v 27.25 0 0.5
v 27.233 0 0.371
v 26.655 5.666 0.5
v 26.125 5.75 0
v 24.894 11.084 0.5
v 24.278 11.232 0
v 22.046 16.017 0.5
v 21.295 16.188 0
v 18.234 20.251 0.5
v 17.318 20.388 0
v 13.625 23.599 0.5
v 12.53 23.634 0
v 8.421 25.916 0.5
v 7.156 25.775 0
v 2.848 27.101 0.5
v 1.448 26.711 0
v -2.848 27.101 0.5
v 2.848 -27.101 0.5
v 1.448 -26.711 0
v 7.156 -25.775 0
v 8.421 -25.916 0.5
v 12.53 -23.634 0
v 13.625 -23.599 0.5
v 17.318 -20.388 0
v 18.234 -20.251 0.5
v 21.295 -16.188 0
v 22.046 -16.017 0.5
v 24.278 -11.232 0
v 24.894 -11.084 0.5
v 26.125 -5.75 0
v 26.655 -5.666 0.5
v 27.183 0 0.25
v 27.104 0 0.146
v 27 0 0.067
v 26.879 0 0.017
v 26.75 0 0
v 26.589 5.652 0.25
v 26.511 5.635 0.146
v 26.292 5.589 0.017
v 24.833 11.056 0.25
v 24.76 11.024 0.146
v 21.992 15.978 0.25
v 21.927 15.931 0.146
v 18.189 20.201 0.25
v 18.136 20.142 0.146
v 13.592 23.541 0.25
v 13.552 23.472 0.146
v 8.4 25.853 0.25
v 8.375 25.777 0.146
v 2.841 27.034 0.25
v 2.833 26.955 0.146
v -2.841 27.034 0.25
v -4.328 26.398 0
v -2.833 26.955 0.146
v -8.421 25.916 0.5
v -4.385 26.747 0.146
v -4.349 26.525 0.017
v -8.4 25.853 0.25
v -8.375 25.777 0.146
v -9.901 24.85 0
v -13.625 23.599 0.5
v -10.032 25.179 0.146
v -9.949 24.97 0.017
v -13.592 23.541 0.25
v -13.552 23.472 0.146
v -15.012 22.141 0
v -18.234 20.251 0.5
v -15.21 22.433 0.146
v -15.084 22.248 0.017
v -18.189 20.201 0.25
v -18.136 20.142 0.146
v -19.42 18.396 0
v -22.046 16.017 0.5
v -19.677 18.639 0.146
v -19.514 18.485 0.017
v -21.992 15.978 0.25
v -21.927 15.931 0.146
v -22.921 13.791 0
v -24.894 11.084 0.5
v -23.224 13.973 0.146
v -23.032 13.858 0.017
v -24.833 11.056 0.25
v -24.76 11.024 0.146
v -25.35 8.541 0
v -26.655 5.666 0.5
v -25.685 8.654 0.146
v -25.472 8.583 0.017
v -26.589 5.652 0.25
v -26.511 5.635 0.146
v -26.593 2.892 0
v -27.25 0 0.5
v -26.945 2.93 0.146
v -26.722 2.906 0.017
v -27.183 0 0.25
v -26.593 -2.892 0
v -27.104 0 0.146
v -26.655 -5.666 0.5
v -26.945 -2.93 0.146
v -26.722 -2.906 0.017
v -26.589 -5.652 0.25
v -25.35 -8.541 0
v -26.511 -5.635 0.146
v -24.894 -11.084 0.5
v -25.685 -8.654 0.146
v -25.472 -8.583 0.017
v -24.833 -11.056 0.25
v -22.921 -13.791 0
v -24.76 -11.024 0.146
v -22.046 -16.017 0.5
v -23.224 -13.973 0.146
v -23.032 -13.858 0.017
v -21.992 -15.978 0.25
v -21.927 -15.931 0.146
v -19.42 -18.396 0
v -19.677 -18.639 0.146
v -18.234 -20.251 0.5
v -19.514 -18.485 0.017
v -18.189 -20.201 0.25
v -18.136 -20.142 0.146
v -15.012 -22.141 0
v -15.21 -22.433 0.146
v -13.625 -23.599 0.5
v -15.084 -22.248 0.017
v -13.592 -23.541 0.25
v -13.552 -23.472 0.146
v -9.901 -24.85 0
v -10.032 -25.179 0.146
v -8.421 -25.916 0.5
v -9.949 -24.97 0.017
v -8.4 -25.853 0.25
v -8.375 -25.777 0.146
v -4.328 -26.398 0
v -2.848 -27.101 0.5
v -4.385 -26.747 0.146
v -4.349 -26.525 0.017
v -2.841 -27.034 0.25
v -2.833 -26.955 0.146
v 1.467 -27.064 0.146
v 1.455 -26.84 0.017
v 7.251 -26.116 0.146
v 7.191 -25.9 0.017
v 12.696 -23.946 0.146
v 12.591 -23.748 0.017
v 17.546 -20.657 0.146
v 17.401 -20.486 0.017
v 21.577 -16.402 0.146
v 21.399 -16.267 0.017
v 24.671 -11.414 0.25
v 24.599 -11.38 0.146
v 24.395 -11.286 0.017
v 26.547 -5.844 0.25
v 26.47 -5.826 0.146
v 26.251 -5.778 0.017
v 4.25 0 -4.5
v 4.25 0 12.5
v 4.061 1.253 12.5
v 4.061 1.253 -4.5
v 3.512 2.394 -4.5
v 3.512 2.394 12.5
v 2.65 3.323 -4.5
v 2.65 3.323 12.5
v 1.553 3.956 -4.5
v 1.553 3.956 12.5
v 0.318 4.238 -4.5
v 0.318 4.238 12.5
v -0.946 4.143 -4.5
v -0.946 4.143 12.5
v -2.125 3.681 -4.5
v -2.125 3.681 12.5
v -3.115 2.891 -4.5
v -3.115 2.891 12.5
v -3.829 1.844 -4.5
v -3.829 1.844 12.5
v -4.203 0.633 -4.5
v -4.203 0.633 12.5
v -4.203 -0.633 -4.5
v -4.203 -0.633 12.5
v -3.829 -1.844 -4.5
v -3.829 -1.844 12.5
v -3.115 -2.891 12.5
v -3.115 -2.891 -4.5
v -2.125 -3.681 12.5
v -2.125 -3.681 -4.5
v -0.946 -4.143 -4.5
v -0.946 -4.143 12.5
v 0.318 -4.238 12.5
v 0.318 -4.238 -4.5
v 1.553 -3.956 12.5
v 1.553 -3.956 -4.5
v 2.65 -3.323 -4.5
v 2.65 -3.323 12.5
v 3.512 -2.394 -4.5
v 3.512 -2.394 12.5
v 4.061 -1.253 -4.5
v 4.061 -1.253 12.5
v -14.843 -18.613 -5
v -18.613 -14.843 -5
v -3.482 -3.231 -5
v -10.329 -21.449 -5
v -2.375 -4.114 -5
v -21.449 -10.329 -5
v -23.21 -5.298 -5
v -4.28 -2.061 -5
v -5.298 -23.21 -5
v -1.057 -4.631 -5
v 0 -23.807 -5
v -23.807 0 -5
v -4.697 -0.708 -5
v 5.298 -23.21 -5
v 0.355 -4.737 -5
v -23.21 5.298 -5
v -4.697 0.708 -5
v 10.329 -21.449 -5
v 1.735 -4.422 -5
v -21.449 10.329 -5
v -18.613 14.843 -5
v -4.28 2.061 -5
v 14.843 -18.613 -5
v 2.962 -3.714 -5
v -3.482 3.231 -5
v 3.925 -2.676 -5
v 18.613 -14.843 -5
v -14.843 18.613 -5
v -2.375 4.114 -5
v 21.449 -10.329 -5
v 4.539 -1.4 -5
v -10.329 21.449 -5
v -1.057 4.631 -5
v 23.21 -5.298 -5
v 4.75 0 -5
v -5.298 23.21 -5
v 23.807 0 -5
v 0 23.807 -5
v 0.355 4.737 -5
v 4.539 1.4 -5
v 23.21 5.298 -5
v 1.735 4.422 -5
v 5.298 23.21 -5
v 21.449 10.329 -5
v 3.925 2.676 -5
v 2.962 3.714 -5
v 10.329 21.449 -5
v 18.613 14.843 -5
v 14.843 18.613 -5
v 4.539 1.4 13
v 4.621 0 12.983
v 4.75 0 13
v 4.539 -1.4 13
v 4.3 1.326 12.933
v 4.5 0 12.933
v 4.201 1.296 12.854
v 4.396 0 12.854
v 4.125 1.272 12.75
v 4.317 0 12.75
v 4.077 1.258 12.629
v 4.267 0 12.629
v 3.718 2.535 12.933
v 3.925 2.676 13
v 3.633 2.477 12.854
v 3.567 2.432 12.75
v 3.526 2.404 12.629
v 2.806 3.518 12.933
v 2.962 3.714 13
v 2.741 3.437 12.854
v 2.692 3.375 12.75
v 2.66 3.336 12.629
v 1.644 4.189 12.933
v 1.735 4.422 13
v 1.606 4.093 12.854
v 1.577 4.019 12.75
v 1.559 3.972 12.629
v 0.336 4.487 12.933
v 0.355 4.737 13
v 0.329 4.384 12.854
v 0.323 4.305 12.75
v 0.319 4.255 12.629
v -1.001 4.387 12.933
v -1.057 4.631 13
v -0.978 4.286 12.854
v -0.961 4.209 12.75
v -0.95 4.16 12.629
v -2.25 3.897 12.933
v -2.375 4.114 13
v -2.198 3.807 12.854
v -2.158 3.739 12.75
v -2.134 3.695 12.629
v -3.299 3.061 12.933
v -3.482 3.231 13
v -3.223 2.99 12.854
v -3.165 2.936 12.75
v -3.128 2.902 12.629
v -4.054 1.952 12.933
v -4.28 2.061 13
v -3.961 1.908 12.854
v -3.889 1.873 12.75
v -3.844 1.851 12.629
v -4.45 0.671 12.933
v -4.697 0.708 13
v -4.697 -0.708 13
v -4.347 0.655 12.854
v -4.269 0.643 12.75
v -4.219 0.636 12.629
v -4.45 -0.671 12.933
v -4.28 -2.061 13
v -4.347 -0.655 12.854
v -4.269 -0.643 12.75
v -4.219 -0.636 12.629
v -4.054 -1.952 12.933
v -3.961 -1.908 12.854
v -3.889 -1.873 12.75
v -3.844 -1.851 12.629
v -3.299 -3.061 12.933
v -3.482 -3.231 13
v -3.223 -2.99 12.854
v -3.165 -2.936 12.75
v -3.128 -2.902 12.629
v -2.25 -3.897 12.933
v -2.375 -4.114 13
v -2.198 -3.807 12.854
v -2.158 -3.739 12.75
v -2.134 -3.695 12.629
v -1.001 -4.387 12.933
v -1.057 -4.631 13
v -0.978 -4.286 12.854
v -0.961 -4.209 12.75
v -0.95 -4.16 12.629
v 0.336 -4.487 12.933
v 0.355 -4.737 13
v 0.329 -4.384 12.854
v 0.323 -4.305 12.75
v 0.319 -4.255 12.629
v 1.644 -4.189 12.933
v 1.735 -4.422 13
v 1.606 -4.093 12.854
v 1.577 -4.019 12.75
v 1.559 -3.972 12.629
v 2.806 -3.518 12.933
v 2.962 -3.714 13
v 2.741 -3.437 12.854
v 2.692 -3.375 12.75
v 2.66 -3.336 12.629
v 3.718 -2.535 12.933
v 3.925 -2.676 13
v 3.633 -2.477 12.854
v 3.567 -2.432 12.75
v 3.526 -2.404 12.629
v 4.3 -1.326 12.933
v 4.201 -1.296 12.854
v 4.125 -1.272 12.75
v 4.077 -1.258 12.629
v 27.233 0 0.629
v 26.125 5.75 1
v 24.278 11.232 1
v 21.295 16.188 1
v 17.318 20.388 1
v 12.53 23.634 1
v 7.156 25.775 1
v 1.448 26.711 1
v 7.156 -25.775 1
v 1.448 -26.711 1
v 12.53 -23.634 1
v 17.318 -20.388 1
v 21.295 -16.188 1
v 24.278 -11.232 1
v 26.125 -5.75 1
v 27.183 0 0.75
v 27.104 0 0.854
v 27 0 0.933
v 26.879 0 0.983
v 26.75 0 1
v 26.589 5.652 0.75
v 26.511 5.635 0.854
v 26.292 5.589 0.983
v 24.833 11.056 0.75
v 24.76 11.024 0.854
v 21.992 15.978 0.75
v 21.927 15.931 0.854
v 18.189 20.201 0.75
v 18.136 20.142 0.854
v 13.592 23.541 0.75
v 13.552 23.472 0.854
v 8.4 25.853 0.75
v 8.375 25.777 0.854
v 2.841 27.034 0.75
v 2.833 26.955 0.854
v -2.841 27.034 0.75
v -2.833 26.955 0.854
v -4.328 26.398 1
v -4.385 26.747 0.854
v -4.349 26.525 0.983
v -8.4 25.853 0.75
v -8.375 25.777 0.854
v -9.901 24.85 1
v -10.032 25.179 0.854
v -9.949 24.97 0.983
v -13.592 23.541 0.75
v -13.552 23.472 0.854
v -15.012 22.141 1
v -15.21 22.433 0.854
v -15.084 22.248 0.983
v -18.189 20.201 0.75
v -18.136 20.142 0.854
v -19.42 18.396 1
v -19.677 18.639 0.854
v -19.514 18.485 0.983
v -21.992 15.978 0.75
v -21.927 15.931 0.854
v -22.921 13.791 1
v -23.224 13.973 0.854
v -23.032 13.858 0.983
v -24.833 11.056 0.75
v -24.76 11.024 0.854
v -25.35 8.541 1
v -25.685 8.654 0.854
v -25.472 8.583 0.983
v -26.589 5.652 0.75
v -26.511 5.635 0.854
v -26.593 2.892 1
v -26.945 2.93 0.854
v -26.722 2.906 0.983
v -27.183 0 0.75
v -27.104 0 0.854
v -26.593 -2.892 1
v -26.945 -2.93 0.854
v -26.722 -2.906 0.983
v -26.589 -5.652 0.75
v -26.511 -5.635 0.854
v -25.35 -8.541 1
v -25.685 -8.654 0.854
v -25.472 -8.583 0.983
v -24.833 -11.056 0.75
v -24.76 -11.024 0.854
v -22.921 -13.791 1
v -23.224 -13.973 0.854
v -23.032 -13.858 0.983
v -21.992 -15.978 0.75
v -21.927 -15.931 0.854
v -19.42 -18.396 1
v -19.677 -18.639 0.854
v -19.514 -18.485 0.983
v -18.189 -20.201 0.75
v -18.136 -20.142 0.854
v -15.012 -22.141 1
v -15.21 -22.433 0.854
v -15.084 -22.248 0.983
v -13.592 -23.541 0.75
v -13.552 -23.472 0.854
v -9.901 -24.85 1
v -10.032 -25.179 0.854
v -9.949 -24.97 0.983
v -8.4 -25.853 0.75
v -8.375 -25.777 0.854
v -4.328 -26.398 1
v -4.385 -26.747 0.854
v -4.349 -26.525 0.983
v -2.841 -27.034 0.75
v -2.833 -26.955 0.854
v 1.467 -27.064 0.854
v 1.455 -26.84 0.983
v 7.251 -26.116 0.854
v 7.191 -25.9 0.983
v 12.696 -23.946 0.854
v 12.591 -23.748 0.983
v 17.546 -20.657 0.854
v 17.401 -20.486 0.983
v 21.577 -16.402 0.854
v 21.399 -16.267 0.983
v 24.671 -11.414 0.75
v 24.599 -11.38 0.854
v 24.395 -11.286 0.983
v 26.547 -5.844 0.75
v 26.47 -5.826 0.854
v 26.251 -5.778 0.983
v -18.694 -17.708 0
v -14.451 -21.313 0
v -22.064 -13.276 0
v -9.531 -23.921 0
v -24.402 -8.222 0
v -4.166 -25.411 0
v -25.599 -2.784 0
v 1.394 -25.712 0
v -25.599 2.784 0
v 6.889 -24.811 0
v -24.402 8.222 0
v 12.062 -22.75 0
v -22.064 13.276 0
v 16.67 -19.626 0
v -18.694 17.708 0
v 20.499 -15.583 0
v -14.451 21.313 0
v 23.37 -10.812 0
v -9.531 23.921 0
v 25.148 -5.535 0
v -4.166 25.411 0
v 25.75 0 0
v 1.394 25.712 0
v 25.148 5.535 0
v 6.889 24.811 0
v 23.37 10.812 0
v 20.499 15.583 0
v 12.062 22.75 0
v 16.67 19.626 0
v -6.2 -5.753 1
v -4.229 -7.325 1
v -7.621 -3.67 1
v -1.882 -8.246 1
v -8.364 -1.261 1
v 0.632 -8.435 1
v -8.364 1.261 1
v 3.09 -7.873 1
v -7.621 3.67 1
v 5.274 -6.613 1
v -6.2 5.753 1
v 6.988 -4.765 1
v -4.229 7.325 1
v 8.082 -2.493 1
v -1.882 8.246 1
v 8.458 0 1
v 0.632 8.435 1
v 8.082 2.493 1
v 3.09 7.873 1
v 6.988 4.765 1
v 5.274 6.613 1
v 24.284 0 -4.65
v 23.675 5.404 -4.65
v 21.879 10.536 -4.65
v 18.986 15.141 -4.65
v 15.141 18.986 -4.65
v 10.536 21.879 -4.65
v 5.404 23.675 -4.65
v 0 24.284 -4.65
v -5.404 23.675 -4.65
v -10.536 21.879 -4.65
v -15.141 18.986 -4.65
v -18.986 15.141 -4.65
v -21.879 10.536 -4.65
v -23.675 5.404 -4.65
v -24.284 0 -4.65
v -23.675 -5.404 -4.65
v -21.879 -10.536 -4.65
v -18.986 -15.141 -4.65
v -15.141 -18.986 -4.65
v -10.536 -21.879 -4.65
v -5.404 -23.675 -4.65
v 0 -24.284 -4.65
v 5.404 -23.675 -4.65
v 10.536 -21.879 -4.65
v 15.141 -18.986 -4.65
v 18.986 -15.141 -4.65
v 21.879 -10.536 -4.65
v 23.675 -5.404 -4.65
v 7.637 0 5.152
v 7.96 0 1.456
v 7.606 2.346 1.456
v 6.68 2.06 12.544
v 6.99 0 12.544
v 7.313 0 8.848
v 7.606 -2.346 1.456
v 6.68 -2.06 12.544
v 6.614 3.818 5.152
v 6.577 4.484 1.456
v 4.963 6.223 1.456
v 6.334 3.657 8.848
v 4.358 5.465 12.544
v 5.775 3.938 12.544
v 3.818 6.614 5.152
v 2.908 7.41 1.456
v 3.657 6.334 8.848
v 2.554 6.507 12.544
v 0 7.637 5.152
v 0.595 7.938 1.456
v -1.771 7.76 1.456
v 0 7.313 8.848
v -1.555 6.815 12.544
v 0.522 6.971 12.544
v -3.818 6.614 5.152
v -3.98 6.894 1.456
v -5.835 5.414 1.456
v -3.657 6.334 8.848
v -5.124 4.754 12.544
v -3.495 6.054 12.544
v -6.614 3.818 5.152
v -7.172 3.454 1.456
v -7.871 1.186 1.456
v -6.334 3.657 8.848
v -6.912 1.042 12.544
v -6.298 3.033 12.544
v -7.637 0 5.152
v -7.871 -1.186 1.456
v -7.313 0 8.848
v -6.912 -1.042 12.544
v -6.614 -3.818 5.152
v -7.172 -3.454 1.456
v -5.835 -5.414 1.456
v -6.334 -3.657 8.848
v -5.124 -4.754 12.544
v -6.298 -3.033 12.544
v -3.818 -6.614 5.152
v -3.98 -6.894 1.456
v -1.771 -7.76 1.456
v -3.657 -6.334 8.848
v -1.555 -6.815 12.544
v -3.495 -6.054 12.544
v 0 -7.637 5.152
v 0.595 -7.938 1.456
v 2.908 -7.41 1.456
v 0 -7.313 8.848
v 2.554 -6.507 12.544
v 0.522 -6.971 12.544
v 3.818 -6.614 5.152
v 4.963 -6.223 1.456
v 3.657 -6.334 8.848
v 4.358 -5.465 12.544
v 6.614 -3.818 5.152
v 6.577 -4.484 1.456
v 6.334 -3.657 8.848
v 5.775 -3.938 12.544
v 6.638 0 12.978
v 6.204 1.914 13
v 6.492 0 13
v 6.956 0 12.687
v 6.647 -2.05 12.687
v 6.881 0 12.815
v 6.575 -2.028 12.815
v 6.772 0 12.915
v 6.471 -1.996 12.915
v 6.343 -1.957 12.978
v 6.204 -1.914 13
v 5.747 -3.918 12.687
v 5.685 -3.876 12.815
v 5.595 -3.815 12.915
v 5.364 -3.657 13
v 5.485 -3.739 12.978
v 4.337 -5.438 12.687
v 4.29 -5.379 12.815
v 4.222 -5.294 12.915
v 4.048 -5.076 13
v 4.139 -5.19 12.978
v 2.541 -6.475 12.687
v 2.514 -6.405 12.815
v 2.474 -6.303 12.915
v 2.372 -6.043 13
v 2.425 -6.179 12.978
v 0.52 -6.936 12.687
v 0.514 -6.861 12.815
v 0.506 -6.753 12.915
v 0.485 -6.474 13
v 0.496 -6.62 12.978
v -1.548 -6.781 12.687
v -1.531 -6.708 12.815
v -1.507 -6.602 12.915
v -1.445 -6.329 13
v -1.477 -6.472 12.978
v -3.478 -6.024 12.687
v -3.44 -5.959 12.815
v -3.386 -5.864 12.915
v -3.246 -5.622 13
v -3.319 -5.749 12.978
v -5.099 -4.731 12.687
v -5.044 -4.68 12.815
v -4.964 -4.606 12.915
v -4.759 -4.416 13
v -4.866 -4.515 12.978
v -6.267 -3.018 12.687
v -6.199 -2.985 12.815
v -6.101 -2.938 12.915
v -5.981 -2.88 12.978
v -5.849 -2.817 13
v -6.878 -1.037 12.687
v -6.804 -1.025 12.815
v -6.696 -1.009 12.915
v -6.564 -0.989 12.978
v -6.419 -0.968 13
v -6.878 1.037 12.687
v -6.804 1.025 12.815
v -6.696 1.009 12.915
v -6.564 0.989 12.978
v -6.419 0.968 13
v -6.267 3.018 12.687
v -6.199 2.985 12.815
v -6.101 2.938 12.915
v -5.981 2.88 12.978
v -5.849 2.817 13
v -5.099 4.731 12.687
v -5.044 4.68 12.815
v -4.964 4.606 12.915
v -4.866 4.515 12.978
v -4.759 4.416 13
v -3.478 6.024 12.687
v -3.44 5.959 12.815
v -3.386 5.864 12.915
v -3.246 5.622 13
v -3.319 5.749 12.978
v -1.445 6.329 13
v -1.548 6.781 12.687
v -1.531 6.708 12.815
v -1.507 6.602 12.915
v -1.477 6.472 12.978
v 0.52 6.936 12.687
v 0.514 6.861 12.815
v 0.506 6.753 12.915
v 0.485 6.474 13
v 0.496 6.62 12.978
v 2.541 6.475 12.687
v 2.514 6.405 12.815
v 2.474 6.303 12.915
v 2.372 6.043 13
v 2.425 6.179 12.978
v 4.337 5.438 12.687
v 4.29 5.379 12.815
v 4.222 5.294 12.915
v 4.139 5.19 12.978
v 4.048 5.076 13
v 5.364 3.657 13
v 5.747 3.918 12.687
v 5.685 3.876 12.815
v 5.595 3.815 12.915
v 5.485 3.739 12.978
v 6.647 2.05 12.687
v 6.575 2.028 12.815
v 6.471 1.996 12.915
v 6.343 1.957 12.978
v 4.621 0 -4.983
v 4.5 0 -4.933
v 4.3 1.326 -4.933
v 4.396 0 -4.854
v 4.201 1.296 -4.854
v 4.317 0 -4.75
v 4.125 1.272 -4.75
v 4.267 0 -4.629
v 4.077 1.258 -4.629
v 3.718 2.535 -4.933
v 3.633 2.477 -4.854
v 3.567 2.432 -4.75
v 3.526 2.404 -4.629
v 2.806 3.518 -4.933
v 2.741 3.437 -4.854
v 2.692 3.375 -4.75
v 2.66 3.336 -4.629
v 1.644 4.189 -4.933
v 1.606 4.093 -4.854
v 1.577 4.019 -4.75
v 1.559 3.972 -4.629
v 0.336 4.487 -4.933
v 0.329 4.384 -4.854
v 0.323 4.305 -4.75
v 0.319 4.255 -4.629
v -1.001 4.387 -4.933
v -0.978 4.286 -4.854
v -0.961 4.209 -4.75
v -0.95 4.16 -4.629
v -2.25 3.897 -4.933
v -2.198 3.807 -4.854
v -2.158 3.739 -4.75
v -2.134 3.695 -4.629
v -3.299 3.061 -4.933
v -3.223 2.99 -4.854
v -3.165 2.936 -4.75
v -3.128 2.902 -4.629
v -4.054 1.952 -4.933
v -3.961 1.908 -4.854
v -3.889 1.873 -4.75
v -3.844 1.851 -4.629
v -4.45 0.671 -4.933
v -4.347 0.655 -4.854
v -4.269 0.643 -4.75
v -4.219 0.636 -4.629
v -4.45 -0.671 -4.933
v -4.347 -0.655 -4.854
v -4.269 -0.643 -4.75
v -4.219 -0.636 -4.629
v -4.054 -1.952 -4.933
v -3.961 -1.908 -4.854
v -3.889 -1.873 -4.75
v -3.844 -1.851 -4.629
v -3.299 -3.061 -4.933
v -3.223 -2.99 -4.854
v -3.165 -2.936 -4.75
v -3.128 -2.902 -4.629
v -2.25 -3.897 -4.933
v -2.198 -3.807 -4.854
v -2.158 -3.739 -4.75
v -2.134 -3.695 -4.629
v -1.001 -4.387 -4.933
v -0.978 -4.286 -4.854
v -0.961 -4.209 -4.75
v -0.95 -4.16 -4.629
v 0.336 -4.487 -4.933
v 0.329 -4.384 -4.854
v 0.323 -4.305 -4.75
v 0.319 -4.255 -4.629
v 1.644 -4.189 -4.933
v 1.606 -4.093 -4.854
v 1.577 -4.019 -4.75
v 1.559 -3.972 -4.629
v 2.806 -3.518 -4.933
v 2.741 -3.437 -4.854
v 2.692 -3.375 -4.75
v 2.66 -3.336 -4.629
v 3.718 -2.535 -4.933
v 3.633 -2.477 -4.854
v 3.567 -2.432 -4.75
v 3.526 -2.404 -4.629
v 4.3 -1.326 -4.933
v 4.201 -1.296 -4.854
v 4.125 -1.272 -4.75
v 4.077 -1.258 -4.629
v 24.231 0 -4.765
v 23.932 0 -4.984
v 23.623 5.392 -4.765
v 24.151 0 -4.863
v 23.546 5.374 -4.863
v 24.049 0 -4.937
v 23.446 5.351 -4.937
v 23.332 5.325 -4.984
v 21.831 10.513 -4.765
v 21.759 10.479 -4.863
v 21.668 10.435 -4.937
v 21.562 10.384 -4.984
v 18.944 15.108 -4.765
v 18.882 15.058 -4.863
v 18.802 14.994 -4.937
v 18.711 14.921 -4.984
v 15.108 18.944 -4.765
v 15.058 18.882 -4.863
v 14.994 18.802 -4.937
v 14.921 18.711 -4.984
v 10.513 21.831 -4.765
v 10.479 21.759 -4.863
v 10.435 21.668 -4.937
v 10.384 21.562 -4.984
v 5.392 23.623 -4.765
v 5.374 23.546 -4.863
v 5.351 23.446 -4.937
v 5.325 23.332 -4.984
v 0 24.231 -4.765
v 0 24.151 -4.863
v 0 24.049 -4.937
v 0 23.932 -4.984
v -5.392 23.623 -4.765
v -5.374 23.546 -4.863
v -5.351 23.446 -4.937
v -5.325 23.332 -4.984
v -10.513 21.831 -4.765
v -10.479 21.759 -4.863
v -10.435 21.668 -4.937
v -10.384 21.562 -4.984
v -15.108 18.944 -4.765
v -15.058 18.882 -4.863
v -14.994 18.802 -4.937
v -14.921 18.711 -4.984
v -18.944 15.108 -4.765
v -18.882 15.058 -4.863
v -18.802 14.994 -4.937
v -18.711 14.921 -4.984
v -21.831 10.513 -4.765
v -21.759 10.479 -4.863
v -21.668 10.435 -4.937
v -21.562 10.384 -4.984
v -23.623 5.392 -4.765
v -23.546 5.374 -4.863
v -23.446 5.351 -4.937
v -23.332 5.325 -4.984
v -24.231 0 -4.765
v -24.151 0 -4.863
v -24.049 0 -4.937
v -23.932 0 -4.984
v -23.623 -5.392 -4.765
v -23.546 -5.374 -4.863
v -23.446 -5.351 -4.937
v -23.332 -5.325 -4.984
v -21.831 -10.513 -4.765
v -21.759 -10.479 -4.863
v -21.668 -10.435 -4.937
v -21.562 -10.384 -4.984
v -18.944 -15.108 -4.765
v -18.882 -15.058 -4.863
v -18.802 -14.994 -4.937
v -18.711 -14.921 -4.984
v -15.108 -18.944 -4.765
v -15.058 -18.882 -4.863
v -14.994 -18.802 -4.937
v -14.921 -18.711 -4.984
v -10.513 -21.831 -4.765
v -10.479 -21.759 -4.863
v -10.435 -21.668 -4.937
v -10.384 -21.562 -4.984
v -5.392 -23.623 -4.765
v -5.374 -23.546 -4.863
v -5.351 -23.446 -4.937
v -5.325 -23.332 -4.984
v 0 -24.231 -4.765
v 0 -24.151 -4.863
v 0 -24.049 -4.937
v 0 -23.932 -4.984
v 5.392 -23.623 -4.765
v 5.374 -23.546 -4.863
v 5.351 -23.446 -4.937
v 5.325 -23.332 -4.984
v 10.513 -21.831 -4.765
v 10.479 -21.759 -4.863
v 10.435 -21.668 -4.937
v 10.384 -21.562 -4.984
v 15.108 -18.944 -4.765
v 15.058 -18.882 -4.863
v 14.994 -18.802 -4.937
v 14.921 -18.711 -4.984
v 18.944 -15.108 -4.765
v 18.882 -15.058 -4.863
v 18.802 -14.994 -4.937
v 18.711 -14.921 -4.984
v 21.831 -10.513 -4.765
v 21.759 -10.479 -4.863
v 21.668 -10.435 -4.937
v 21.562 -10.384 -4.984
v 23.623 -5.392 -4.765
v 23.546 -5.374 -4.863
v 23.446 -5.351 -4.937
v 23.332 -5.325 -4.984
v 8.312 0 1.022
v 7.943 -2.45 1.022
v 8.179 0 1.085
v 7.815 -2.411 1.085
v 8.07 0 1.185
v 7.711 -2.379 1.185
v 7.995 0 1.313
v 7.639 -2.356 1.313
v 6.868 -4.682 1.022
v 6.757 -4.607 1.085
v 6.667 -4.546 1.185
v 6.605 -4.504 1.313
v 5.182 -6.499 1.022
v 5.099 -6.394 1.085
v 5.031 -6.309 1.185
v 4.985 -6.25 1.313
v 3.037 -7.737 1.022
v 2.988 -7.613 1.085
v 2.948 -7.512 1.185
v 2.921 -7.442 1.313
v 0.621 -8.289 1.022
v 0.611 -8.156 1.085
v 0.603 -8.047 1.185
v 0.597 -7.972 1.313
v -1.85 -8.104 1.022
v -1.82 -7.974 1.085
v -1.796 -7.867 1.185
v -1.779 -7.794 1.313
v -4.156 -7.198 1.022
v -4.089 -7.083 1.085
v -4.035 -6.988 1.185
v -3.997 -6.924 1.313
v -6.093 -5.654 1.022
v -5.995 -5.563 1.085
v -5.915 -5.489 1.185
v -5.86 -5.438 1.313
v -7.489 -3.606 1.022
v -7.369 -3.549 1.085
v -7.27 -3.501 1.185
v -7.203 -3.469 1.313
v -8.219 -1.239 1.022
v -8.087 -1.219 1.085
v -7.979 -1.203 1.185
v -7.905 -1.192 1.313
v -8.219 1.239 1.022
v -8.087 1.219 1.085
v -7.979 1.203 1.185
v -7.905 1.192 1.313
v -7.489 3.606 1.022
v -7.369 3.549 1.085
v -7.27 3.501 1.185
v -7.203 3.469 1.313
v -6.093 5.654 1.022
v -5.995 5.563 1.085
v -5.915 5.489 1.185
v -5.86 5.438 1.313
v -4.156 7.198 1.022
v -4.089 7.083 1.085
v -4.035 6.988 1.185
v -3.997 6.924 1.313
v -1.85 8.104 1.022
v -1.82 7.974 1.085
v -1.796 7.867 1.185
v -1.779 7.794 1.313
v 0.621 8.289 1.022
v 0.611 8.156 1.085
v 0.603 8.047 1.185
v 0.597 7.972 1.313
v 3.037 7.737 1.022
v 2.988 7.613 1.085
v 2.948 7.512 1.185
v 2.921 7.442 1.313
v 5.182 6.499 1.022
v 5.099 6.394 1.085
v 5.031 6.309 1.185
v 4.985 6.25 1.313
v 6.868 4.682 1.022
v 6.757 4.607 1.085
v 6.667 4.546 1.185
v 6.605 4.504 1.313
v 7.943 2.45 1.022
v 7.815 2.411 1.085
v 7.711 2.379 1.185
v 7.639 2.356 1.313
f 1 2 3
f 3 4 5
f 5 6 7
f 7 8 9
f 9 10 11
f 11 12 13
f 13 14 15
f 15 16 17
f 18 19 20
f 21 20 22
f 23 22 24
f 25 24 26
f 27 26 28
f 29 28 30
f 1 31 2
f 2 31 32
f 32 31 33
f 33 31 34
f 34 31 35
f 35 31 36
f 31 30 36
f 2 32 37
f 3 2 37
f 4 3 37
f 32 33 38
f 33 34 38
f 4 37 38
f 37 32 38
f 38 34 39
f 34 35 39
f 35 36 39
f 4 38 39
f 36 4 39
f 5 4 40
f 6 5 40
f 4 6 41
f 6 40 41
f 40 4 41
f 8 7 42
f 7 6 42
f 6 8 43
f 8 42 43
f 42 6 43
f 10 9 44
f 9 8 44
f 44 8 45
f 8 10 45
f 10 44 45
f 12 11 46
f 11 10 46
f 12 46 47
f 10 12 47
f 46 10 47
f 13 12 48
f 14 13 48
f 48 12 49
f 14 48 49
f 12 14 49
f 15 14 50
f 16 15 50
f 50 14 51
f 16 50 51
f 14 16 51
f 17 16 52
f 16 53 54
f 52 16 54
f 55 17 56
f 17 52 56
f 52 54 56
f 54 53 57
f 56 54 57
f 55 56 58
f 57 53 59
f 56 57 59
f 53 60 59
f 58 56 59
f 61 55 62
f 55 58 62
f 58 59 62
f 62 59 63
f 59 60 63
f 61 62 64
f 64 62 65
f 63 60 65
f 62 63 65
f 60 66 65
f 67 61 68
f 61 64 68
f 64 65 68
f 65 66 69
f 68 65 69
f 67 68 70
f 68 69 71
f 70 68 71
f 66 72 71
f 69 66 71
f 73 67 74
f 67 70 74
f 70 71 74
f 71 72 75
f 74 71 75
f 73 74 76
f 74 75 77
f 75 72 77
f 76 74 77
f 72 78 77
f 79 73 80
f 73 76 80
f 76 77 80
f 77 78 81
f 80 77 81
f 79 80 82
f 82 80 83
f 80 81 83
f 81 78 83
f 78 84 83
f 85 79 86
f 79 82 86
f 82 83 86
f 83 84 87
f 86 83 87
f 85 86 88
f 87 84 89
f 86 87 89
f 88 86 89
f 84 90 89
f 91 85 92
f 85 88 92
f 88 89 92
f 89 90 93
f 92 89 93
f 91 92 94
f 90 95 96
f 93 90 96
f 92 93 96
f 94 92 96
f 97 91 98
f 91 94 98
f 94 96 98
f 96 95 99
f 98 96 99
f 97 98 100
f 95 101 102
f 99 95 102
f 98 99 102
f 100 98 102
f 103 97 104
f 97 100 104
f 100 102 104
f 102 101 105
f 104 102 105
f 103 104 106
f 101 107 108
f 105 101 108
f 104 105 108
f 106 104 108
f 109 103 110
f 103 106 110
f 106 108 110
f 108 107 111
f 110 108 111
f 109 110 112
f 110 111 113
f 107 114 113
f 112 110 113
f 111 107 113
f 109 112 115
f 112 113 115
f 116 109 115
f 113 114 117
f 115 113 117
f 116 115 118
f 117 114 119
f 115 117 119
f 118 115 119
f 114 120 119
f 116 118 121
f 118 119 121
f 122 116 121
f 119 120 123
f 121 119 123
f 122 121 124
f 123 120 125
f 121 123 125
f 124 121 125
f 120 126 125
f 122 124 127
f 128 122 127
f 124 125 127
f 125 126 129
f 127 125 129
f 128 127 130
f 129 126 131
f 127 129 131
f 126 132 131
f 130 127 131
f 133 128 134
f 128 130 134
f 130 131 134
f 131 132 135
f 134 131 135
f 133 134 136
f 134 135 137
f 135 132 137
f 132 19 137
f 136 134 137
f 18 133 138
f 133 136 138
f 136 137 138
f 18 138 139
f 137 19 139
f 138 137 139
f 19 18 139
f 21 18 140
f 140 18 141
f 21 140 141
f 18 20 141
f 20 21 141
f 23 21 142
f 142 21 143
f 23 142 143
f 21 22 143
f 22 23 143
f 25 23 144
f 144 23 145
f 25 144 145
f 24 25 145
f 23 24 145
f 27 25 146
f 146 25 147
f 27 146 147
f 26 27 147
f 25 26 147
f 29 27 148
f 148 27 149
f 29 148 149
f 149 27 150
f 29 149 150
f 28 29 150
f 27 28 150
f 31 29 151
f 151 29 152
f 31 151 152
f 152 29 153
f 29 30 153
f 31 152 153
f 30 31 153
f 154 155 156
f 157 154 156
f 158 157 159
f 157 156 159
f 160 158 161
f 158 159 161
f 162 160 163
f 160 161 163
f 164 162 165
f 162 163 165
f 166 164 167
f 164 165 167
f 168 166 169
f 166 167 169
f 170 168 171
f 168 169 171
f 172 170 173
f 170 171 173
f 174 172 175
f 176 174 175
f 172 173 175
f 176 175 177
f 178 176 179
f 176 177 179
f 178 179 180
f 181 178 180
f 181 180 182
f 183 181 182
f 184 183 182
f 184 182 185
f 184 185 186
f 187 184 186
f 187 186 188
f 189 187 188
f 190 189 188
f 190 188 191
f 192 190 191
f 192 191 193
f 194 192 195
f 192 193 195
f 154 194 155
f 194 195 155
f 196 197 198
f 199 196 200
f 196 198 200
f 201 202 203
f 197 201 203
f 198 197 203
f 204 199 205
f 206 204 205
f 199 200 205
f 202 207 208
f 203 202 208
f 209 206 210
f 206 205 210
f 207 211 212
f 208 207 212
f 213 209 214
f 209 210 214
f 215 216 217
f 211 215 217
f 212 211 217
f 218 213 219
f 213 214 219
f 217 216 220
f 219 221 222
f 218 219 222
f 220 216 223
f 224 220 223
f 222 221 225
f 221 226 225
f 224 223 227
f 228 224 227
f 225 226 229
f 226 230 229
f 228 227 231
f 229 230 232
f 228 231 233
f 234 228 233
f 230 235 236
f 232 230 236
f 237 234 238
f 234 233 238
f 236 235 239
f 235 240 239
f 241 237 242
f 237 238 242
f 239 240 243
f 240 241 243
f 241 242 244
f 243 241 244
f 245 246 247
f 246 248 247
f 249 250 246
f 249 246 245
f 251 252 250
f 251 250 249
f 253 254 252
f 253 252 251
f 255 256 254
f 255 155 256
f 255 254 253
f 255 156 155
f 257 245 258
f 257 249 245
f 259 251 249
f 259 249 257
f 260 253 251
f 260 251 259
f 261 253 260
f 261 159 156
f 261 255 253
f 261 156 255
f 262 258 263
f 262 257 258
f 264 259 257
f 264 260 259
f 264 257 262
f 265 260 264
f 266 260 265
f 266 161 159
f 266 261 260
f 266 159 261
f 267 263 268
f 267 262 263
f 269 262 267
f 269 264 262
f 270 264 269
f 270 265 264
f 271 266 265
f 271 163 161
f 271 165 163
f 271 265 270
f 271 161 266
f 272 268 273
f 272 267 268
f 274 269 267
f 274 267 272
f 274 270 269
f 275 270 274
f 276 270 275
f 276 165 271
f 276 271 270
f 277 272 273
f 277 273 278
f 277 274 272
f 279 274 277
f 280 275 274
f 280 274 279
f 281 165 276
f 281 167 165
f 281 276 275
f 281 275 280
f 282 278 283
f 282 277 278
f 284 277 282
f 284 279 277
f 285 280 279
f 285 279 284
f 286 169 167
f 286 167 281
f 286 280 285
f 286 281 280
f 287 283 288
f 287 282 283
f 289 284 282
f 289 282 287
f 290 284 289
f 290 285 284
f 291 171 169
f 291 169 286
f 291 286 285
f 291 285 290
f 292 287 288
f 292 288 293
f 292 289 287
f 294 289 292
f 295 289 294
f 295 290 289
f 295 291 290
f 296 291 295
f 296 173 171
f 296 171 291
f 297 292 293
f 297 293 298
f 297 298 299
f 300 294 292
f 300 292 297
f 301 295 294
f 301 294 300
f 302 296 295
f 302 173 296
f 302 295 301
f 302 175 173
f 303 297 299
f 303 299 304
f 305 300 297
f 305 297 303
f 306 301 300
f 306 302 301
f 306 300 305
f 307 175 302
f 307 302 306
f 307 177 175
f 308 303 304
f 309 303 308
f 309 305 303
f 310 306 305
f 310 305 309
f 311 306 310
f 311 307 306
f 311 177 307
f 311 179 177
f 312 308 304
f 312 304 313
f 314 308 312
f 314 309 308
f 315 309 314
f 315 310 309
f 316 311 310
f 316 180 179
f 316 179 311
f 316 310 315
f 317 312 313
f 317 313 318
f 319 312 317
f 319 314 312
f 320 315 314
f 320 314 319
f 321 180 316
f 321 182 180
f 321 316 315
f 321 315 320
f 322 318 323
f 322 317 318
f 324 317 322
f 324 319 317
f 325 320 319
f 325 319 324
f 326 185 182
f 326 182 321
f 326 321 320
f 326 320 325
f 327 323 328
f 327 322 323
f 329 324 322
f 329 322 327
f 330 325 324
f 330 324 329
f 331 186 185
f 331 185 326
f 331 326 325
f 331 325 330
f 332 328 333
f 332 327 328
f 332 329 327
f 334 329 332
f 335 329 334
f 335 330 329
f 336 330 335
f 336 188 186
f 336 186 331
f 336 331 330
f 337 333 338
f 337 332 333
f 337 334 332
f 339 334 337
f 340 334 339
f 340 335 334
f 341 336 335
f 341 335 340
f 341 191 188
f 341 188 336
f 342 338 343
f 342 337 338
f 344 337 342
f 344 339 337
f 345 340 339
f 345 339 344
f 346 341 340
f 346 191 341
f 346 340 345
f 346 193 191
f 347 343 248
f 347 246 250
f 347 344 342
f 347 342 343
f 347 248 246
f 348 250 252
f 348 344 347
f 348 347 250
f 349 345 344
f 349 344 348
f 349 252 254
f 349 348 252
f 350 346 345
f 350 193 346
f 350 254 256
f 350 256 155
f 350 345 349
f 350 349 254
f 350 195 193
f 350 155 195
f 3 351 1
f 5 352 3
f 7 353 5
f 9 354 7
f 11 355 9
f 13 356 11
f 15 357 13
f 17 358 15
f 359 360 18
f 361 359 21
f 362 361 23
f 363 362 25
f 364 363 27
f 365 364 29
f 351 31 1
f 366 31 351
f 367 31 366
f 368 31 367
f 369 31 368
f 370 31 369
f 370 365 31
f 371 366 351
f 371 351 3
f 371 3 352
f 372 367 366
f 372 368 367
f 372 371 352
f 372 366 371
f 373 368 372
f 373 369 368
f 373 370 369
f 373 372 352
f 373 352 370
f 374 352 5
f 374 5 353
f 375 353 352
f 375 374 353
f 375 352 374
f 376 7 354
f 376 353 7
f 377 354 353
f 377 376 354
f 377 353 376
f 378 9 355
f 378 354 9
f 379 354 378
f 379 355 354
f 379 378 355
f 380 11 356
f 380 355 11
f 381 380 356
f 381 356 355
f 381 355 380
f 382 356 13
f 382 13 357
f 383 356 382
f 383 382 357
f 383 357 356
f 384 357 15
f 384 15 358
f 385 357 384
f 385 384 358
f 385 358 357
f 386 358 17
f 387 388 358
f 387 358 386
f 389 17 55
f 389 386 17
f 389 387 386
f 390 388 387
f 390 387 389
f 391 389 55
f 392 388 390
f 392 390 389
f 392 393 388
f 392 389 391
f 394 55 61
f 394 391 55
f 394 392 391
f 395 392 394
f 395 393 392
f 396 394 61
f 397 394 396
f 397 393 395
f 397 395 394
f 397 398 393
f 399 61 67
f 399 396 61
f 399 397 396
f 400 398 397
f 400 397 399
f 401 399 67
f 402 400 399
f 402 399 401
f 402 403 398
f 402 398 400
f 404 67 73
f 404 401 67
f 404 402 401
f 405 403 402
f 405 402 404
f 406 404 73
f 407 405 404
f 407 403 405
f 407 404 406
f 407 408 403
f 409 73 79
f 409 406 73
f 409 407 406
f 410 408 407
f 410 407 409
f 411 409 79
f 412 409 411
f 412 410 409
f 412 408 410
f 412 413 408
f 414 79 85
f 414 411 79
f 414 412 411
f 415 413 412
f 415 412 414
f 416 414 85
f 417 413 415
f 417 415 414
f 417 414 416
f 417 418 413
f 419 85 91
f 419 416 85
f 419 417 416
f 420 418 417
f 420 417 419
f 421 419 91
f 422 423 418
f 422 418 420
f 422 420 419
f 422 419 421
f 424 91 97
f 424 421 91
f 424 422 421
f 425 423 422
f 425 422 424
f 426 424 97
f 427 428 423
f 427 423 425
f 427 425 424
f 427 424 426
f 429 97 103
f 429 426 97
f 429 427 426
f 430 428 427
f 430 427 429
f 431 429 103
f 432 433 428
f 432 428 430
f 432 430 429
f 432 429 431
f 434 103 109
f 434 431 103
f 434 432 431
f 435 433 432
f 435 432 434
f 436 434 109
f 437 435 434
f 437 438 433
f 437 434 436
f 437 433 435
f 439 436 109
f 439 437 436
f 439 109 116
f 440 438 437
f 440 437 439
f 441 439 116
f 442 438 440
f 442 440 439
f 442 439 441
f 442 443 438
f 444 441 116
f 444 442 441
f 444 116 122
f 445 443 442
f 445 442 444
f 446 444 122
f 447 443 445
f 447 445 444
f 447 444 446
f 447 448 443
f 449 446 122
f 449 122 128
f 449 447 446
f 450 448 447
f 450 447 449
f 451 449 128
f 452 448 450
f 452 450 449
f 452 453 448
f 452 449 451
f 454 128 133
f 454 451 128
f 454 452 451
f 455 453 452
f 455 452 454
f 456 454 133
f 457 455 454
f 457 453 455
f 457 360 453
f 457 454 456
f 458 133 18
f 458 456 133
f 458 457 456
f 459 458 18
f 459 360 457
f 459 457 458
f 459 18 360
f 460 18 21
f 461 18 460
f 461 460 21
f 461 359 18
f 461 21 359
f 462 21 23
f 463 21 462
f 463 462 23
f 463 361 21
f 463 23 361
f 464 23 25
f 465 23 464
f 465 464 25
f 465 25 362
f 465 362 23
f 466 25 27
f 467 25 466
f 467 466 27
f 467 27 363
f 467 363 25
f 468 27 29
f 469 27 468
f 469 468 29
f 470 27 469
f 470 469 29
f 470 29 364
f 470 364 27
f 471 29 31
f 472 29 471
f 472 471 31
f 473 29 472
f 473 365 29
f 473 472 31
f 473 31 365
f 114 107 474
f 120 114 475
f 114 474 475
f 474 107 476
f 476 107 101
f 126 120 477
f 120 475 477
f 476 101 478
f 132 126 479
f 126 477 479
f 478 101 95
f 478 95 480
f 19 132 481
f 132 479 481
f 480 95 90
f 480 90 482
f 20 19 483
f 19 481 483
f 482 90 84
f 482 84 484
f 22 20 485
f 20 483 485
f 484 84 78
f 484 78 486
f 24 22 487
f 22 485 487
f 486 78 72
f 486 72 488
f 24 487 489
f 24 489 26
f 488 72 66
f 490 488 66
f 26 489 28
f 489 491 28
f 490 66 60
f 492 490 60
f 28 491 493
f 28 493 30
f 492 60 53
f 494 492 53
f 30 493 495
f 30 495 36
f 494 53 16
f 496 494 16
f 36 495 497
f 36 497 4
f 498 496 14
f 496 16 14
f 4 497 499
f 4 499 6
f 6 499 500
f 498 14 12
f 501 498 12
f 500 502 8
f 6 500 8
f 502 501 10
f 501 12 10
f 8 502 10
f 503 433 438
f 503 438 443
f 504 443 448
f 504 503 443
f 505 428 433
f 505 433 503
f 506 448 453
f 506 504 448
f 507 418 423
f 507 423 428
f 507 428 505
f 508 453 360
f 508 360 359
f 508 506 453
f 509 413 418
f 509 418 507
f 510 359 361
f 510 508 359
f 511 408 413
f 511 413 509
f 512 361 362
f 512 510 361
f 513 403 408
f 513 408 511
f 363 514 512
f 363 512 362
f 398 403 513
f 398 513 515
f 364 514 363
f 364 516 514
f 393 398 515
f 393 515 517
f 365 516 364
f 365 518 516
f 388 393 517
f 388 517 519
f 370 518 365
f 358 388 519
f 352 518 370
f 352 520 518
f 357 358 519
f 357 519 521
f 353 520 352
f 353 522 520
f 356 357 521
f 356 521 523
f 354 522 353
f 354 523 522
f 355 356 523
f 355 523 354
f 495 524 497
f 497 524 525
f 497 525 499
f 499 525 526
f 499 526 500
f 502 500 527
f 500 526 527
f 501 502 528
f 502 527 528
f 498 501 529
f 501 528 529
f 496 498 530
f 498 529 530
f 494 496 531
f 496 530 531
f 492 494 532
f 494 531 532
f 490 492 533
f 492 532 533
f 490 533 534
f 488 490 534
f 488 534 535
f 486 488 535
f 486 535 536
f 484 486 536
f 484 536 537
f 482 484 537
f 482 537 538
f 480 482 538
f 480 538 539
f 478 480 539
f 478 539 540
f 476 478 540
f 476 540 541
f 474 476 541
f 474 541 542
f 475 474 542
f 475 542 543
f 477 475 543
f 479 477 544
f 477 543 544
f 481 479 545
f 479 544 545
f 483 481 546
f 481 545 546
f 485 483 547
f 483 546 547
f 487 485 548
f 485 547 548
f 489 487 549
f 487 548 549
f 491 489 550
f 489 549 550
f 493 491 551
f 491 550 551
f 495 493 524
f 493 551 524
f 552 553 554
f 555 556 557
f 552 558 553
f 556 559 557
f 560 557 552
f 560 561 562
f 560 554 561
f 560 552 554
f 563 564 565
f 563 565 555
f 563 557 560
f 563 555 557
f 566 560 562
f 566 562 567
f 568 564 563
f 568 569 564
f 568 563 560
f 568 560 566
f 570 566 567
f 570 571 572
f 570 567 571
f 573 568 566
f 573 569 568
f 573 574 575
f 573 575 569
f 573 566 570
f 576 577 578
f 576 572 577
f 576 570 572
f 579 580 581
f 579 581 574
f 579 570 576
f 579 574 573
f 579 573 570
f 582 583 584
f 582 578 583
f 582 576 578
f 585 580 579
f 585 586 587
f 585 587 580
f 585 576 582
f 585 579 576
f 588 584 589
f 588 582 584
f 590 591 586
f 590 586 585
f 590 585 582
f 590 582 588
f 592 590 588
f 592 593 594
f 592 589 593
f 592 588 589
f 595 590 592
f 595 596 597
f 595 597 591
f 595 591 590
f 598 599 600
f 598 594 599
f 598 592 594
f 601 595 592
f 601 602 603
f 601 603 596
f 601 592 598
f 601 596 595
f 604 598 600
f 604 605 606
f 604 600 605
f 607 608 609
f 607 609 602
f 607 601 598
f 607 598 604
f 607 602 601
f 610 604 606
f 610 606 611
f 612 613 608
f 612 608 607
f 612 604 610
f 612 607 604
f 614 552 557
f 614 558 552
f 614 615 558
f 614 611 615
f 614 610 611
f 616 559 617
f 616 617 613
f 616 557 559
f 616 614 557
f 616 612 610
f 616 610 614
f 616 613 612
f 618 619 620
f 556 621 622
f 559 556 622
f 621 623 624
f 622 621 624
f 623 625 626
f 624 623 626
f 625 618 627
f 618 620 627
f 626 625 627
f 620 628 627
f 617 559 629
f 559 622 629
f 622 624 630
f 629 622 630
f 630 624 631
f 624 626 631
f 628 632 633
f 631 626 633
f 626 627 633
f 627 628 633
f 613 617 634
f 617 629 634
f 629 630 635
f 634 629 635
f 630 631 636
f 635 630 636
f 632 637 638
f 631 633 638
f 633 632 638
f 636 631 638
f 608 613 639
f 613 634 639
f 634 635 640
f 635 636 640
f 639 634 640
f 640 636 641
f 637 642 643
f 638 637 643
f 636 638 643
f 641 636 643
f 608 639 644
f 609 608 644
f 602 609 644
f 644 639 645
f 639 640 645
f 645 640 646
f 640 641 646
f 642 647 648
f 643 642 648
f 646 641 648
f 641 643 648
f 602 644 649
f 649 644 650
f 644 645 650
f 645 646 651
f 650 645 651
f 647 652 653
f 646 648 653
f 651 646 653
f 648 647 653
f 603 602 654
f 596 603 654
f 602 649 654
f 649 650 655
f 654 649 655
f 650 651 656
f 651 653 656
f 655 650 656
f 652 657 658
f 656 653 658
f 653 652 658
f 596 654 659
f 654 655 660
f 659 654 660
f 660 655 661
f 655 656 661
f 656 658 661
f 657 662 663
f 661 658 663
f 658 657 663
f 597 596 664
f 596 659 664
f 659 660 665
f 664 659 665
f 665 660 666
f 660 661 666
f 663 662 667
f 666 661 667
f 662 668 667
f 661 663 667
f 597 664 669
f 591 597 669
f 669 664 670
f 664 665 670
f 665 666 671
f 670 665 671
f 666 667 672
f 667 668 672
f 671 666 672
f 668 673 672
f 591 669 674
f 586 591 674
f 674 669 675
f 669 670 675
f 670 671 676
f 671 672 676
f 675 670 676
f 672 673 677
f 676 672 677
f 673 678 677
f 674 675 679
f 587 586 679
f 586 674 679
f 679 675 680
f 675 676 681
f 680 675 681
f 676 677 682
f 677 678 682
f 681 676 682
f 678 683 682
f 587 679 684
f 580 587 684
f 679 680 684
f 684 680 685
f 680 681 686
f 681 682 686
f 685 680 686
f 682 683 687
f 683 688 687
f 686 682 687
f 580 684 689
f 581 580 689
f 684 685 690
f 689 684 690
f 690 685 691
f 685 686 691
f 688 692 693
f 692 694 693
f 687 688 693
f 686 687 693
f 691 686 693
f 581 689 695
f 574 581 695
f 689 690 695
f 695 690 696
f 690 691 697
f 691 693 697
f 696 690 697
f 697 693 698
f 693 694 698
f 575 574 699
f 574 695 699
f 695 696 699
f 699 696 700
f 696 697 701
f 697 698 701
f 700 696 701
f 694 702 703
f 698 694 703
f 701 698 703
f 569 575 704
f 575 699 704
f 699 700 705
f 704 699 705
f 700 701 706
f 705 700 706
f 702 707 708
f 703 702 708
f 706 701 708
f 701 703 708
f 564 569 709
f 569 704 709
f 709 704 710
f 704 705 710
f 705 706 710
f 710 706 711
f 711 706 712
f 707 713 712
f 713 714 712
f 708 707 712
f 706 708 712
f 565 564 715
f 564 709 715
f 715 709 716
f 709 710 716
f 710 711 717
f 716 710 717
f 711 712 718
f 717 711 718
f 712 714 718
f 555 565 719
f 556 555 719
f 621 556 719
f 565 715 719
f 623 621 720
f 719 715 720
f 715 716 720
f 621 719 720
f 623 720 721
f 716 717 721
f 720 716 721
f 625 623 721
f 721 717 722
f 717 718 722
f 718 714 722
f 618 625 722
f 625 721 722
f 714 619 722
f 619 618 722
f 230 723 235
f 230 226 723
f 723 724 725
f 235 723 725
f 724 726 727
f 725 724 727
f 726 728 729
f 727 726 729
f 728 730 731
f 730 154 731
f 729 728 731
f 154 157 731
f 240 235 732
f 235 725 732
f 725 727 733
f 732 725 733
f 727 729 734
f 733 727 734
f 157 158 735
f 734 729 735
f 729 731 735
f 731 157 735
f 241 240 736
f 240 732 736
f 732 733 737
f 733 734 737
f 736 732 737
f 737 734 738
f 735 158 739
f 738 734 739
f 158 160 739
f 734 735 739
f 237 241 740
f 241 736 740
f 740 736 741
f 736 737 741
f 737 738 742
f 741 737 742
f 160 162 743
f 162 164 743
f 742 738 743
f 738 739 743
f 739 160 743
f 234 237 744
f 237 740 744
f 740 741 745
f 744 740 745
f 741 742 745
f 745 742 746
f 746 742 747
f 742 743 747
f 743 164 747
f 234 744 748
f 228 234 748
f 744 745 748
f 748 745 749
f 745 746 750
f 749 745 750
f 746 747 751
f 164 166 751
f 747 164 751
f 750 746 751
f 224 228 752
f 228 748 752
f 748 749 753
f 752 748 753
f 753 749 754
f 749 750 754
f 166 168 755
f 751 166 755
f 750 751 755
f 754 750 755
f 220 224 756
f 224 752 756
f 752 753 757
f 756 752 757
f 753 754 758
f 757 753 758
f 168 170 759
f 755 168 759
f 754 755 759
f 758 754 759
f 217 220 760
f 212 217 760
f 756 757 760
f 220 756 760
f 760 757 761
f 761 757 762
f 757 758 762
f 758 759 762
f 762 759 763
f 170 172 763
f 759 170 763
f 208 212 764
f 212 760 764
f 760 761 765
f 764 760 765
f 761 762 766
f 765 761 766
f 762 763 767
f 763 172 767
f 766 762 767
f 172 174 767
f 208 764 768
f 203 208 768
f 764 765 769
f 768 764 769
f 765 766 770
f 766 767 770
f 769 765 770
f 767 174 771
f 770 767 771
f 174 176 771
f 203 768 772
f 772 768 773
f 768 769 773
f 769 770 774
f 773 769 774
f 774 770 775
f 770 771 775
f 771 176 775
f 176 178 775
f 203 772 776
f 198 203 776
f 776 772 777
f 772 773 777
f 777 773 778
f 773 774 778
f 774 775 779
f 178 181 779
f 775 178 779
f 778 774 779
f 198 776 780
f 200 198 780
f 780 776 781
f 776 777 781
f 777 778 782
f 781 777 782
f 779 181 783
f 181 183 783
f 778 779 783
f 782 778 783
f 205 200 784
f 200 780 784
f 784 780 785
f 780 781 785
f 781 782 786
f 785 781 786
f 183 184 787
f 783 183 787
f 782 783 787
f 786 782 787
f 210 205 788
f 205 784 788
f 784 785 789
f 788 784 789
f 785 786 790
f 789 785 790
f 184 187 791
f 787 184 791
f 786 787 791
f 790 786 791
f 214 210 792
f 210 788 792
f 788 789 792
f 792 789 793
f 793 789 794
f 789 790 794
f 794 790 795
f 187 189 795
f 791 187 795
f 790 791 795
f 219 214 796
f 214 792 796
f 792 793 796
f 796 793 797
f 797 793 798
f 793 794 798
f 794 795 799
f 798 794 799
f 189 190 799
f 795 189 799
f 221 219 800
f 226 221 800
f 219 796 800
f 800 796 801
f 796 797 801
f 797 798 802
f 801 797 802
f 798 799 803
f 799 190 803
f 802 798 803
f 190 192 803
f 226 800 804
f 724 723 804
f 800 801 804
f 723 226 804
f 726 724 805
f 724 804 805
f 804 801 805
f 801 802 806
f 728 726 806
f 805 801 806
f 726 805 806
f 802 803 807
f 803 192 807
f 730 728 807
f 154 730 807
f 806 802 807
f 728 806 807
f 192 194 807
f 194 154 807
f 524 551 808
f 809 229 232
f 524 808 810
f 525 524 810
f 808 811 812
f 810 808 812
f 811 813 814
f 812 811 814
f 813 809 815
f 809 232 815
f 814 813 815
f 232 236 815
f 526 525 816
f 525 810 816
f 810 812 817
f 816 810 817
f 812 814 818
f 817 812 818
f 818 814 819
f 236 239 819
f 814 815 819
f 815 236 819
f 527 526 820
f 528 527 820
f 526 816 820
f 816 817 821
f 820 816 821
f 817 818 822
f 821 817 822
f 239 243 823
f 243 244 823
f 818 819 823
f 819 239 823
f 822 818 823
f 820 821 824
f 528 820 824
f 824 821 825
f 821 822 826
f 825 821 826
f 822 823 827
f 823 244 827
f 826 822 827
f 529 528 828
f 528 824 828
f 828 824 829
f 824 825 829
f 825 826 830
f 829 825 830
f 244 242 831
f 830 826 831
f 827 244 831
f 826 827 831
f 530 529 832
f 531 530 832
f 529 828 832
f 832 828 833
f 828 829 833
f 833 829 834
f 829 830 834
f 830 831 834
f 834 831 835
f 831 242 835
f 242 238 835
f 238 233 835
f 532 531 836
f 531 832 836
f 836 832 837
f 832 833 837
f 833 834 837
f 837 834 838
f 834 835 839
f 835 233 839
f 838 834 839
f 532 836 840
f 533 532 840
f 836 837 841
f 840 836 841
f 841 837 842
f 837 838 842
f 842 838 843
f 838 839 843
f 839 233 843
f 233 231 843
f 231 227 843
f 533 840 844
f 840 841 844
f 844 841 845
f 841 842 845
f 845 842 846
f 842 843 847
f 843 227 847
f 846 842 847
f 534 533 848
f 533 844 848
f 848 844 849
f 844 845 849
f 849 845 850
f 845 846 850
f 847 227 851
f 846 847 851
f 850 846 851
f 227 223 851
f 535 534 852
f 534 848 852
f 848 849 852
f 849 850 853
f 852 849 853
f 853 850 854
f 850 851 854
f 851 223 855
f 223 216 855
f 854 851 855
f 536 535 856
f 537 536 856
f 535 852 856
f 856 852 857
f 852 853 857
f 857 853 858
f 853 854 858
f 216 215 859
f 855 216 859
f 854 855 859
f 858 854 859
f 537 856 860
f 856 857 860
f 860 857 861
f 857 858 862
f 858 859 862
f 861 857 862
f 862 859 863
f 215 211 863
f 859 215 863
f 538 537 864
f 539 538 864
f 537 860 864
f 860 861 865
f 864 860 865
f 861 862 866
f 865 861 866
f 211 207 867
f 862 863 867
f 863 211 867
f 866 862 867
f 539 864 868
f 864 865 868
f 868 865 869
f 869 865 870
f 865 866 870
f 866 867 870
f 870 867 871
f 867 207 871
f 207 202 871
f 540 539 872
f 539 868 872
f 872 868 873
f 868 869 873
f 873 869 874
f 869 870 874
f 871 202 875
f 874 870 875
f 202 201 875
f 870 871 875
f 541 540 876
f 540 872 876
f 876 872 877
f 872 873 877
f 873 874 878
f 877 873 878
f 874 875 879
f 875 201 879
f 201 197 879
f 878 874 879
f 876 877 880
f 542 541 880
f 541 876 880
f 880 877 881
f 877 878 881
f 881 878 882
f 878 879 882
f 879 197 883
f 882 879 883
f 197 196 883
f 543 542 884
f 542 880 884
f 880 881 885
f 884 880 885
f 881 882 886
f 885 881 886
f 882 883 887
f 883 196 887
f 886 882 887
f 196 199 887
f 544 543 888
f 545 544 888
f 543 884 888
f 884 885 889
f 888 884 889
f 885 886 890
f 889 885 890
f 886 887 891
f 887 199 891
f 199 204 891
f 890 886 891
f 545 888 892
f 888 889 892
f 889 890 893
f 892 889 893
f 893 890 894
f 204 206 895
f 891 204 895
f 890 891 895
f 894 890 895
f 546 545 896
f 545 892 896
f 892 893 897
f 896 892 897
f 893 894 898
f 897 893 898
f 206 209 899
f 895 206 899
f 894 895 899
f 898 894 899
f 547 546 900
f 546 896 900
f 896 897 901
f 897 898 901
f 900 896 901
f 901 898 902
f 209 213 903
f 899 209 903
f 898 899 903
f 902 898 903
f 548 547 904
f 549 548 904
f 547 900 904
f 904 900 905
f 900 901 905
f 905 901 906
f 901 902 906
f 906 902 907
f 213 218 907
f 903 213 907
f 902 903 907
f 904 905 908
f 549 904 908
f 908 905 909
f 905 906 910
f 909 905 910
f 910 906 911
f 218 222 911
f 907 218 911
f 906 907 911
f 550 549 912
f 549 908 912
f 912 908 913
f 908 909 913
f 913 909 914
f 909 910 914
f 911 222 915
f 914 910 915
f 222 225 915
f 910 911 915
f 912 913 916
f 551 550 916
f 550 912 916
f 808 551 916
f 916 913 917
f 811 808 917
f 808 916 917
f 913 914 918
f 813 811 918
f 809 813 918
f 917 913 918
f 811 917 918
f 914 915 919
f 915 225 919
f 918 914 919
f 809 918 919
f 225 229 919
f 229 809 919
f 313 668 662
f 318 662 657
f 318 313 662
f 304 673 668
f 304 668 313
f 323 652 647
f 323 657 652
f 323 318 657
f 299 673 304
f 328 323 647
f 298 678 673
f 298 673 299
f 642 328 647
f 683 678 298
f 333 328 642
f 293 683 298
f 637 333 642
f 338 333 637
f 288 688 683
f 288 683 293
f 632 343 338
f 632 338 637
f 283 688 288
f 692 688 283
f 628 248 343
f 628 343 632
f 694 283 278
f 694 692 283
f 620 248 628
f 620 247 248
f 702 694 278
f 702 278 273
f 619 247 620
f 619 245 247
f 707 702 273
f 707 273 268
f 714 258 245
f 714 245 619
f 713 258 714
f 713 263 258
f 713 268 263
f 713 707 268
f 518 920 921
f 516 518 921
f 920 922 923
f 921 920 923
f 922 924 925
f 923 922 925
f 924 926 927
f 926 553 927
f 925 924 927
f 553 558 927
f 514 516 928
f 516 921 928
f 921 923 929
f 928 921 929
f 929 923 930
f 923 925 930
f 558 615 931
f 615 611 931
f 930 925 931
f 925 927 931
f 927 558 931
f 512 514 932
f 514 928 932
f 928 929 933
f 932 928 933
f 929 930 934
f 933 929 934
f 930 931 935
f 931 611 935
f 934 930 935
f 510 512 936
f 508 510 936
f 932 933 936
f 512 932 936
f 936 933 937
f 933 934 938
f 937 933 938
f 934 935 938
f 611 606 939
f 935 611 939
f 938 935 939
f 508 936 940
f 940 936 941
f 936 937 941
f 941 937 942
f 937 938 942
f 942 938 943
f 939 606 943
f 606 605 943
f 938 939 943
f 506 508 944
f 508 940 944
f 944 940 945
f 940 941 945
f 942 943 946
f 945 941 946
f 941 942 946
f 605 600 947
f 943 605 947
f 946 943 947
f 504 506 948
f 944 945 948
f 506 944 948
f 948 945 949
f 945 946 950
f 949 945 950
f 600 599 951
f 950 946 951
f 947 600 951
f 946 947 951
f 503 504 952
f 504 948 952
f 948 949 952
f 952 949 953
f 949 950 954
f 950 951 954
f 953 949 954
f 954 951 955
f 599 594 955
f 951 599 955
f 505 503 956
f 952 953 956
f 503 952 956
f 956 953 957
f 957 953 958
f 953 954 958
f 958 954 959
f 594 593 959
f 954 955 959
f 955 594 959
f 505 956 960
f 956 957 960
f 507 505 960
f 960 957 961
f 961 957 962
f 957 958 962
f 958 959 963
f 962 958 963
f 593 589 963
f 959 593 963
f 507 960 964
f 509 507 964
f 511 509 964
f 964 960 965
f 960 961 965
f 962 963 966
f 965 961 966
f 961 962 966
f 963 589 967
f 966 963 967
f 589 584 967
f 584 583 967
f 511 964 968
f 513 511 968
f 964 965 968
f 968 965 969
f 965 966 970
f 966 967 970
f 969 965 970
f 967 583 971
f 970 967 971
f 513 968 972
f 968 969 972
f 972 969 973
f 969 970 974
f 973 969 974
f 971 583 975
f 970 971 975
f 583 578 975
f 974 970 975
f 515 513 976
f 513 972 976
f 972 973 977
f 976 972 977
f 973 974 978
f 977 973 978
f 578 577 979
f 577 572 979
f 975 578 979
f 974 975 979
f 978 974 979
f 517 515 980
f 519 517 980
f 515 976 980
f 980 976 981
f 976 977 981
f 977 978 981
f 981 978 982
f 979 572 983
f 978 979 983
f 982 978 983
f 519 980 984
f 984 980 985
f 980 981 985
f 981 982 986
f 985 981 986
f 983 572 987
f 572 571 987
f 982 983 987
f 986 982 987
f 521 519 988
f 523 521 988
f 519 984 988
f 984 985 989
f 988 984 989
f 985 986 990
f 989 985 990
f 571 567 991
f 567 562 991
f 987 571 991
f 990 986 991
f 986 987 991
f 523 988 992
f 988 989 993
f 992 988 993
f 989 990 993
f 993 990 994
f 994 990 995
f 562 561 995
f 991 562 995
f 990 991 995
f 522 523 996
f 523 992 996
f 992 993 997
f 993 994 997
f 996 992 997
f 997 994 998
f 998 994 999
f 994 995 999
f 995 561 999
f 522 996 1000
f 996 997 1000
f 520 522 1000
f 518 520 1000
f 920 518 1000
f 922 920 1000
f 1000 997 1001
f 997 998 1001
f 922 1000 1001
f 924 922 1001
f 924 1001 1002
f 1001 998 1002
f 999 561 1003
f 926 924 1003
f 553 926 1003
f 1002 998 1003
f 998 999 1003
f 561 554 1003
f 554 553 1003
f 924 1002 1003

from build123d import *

# Parameters (mm, degrees)
F0_R     = 27.25
F0_R_2   = 25.75
F0_R_3   = 24.25
F1_DEPTH = 1
F2_DEPTH = 5
F2_TAPER = 17.5
F3_R     = 8
F4_DEPTH = 12
F4_TAPER = 5
F5_R     = 4.25
F6_DEPTH = 18
F7_R     = 0.49999


# Not quite as in the source:
# - a fillet or chamfer is up to 0.001 mm smaller than in the source, because OpenCascade refuses the exact size


with BuildPart() as f1:
    # F0 (on Top) → F1 (new body)
    with BuildSketch(Plane.XY):
        Circle(F0_R)
        Circle(F0_R_2, mode=Mode.SUBTRACT)
        Circle(F0_R_2)
        Circle(F0_R_3, mode=Mode.SUBTRACT)
        Circle(F0_R_3)
    extrude(amount=F1_DEPTH)

    # F0 (on Top) → F2 (join)
    with BuildSketch(Plane.XY):
        Circle(F0_R_2)
        Circle(F0_R_3, mode=Mode.SUBTRACT)
        Circle(F0_R_3)
    extrude(amount=-F2_DEPTH, taper=F2_TAPER)

    # F3 (on face) → F4 (join)
    with BuildSketch(Plane.XY.offset(1)):
        Circle(F3_R)
    extrude(amount=F4_DEPTH, taper=F4_TAPER)

    # F5 (on face) → F6 (cut, through all)
    with BuildSketch(Plane.XY.offset(13)):
        Circle(F5_R)
    extrude(amount=-F6_DEPTH, mode=Mode.SUBTRACT)

    # F7 (radius 0.5 in the source; OpenCascade refuses exactly that, so slightly less here)
    f7_edges = [f1.edges().sort_by_distance(p)[0] for p in [
        (-24.173506, 0, -5),
        (-27.25, 0, 0),
        (-27.25, 0, 1),
        (-4.25, 0, -5),
        (-8, 0, 1),
        (-6.950136, 0, 13),
        (-4.25, 0, 13),
    ]]
    fillet(f7_edges, radius=F7_R)


solid = f1.part
